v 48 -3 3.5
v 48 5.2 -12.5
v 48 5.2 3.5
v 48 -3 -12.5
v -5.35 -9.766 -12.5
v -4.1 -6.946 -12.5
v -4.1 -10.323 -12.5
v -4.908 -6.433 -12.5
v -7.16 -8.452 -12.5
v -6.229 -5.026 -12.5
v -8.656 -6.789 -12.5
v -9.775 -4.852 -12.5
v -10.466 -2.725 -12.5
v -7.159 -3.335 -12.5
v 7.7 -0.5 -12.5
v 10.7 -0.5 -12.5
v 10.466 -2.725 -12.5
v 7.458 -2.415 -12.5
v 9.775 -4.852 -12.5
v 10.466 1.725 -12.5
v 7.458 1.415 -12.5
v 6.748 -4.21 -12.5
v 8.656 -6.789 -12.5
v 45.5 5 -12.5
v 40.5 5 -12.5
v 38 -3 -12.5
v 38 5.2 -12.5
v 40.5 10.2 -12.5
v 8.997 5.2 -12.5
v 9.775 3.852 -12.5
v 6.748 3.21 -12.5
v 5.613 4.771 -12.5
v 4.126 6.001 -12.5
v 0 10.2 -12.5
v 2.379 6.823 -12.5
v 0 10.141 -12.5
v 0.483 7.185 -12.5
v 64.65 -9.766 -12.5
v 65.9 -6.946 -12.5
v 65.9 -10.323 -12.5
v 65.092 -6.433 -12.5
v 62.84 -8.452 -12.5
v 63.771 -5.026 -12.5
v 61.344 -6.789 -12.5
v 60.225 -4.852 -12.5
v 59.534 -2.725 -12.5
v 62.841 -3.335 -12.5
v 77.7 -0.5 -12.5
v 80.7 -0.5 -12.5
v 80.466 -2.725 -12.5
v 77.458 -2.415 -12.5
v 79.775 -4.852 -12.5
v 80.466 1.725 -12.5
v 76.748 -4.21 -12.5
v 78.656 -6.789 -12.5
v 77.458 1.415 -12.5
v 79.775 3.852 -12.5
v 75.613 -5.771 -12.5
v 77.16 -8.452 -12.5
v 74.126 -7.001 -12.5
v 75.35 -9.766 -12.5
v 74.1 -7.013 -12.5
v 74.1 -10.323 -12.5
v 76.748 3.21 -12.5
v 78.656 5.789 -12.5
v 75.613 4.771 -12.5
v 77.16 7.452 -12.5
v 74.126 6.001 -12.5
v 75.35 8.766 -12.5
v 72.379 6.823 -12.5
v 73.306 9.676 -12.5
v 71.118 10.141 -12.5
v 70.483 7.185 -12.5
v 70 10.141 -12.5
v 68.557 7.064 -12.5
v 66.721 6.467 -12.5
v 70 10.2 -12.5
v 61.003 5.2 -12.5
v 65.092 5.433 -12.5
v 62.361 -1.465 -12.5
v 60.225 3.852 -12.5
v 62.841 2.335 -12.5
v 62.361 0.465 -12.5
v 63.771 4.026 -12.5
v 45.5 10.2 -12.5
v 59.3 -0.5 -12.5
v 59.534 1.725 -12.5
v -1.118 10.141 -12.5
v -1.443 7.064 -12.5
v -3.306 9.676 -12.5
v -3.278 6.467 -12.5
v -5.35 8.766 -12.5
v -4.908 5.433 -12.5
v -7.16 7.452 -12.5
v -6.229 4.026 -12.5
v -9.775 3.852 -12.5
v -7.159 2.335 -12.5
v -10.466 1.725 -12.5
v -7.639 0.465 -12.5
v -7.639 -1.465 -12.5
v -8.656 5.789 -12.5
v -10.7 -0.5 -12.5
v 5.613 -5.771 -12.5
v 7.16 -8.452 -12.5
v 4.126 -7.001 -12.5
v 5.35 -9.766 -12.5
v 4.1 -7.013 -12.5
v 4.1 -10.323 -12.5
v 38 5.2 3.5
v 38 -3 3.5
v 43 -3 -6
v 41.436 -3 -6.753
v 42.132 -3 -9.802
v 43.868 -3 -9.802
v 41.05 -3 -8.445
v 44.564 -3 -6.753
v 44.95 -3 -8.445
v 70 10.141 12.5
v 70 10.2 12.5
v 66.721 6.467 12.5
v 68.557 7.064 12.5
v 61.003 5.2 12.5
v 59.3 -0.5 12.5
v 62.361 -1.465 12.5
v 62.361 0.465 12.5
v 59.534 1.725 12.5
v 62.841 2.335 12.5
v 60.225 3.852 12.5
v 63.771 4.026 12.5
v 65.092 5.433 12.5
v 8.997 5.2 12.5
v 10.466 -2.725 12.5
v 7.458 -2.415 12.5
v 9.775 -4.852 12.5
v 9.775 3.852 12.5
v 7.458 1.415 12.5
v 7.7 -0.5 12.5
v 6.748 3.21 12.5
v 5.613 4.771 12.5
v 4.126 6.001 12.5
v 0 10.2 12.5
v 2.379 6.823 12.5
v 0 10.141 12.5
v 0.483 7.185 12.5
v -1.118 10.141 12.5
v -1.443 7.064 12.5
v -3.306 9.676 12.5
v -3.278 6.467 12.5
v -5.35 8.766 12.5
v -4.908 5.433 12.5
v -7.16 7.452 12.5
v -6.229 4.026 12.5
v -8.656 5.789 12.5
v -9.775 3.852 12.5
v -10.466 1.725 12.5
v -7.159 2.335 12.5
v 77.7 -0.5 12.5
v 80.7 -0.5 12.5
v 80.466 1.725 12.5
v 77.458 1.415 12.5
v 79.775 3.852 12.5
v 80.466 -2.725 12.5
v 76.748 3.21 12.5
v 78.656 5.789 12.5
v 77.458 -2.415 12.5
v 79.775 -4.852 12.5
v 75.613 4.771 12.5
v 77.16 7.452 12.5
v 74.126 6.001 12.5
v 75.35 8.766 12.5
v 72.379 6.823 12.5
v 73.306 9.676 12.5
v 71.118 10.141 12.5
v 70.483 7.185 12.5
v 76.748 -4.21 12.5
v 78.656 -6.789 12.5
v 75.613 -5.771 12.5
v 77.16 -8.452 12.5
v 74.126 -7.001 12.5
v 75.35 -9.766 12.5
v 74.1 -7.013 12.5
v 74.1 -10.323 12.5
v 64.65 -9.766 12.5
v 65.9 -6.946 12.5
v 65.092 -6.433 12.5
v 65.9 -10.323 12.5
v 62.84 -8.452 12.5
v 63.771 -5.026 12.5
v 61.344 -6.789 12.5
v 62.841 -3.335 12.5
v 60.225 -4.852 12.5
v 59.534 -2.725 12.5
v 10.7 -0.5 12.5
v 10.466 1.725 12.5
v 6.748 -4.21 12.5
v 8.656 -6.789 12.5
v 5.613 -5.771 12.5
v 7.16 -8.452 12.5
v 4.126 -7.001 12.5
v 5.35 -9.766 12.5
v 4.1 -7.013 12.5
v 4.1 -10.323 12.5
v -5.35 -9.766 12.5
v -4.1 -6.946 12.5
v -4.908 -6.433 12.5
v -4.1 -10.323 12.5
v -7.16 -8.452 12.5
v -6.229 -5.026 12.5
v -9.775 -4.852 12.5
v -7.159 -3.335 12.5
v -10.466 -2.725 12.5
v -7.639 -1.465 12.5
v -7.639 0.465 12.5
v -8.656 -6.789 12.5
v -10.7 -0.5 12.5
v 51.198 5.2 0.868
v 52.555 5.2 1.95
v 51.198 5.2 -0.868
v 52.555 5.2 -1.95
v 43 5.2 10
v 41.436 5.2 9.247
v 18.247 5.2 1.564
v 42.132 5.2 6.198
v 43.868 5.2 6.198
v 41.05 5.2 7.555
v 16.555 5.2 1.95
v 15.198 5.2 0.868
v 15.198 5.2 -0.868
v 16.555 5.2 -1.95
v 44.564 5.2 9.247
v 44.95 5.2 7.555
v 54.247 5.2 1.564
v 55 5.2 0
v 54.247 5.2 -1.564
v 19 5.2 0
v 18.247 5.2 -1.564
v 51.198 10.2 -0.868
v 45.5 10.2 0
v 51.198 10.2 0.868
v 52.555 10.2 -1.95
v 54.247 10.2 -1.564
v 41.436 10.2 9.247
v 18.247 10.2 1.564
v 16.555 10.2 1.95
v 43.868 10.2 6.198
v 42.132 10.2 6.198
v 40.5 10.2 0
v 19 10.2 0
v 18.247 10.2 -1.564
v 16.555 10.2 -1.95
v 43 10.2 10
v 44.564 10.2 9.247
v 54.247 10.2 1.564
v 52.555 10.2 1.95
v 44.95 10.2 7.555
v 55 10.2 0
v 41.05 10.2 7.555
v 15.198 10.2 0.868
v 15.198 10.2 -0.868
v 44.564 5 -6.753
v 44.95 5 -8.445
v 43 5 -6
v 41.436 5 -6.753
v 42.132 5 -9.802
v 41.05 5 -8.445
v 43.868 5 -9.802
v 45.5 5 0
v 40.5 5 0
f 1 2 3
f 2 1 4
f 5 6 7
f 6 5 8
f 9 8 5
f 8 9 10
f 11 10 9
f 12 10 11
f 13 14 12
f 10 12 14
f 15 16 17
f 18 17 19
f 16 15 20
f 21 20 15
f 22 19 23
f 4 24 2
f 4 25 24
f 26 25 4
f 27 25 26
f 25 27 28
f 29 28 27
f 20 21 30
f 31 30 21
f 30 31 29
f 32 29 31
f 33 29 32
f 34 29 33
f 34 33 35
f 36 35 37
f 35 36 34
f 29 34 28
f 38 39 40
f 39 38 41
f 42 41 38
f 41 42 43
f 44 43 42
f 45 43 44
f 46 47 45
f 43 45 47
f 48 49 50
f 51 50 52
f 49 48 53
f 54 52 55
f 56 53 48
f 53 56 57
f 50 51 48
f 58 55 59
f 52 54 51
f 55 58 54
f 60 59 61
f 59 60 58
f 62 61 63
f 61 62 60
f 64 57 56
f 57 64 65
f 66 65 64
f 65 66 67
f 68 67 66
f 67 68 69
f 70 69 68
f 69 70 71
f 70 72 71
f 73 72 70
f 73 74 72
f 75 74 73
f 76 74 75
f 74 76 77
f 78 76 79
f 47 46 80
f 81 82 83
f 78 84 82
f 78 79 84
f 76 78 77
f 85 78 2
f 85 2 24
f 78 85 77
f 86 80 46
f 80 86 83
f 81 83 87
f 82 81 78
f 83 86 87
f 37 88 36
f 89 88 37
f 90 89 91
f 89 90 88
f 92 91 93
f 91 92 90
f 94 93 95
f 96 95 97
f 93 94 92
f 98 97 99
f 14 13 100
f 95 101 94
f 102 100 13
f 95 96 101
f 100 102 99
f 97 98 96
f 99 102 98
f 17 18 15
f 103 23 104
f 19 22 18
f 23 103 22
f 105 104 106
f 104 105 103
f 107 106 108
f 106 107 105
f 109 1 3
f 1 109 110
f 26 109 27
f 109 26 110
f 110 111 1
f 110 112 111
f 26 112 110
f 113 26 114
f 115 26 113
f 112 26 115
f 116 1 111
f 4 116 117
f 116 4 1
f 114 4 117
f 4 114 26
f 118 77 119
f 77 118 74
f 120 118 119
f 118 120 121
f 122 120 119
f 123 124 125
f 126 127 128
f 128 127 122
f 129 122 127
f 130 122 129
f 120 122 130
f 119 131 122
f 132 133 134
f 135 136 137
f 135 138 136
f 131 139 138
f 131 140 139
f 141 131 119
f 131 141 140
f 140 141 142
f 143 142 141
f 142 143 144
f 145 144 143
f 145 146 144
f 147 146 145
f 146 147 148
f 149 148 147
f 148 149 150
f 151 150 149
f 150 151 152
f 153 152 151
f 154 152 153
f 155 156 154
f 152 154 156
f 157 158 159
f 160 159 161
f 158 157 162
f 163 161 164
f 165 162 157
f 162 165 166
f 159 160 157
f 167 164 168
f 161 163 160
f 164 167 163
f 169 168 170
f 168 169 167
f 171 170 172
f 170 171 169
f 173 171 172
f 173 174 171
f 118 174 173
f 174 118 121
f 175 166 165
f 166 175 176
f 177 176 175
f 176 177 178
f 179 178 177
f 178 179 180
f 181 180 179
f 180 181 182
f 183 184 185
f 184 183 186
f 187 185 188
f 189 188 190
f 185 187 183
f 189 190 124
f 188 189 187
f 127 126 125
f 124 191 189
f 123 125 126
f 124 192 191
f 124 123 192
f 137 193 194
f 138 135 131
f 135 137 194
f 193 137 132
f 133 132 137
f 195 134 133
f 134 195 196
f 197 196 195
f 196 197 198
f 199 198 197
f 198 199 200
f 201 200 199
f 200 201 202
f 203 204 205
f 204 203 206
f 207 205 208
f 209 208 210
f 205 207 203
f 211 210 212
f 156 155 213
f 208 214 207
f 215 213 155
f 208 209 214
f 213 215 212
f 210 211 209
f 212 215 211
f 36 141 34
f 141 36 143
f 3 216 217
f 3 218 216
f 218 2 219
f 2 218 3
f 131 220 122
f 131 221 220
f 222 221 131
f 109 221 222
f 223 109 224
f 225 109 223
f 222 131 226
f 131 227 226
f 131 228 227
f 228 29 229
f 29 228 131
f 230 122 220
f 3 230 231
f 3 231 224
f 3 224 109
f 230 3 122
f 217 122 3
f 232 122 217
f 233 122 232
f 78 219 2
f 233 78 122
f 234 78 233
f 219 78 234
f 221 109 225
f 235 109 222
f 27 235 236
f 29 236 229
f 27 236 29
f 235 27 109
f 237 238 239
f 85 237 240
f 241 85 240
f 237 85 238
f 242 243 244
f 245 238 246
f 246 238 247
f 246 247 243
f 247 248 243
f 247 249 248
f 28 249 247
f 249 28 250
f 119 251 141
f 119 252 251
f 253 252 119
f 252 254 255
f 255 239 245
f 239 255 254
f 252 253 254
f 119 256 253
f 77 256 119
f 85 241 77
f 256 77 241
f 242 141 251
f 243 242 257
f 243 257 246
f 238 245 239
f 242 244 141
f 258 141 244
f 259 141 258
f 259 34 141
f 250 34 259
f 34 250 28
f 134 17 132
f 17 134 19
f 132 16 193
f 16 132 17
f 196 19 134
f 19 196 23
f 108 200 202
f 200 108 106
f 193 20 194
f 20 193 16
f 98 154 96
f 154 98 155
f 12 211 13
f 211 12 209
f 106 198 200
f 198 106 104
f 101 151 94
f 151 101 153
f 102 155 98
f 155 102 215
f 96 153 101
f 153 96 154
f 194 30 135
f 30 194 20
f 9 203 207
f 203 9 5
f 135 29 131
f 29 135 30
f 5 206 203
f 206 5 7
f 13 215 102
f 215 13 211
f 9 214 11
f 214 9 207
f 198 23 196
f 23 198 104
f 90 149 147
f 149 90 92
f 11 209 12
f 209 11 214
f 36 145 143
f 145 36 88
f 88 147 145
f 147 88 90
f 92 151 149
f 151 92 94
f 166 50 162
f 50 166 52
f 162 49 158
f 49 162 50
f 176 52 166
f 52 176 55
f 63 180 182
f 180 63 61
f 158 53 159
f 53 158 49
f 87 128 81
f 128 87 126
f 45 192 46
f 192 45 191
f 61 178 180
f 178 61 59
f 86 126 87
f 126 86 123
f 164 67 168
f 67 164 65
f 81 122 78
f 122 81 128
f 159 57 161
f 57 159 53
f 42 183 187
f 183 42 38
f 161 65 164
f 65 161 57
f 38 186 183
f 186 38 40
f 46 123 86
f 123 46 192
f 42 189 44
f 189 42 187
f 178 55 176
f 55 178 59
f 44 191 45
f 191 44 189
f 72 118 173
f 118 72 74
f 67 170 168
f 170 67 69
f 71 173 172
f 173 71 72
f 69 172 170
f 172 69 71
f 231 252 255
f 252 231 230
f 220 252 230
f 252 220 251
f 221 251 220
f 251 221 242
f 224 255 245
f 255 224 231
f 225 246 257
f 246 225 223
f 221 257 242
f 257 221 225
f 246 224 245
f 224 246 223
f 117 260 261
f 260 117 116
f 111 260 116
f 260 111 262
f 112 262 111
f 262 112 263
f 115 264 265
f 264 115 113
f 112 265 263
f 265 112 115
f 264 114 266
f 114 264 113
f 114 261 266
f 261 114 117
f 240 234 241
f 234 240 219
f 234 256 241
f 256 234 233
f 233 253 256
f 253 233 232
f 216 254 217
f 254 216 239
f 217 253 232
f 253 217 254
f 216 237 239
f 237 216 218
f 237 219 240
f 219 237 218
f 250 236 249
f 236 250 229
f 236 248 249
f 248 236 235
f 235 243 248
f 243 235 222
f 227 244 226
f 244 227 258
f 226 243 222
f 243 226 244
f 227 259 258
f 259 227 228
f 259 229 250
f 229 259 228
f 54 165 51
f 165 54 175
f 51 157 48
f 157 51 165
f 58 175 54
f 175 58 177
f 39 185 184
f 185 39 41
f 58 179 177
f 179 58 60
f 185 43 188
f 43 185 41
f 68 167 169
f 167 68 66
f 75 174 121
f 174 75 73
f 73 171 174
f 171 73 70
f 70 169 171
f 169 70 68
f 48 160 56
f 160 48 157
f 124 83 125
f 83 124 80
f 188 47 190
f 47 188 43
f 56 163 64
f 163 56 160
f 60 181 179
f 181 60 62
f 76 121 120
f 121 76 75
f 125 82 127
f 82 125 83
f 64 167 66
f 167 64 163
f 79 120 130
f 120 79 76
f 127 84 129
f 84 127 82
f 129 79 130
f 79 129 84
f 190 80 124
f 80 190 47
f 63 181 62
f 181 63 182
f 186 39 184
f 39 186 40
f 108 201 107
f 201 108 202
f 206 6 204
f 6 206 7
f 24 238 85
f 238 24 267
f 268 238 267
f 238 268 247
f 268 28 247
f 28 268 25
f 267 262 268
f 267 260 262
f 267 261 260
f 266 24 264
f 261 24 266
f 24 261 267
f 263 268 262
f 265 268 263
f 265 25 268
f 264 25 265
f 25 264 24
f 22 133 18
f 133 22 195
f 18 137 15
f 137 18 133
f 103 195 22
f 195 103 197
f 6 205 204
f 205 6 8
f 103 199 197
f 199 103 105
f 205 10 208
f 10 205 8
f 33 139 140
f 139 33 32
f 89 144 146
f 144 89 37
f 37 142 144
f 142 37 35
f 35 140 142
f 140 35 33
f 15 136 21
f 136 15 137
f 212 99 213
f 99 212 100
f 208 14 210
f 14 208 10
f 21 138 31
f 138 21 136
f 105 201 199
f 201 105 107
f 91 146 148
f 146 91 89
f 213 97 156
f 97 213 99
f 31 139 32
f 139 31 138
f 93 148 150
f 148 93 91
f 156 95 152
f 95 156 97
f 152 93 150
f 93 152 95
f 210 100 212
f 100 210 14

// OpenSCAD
// file: Rook_Config.scad
// Rook 3D Printer Configuration
// Created By Jeffrey Olijar 
// Jolijar@gmail.com

// Layer Height
LH = 0.38;

// 608 skate bearing
Bearing_OD = 22.5; 
Bearing_ID = 8;
Bearing_H = 7;

// M3 Nut Diameter
N3 = 7.5;

// M4 Screw Hole Diameter
M4 = 4;

// M5 Screw Hole Diameter
M5 = 5.4;

// M8 Rod Diameter (configure for a tight fit)
M8 = 8.2;

// M8 Nut Diameter
N8 = 15.5;

//LM8UU Bearing
LBD = 15.4; // Diameter
LBH = 25; // Height
LBI = 8;  // Inner Diameter

//Makergear Groovemount
GVO = 16.5; // Outside Diameter
GVI = 12.5;  // Inside Groove Diameter

// Distance Between Centers for X rods
DBCX = 70;
// main file
// Rook 3D Printer 
// X Carriage Holder
// Created By Jeffrey Olijar 
// Jolijar@gmail.com
// Revision 1.00
// 1 x required 

include <Rook_Config.scad> 

module Rook_X_Carriage_Holder(){



rotate(a=[180,0,0]){

difference(){ 

union(){




translate (v=[DBCX/2+8,-2,4.5]){ 
		cube(size =[10,10,16], center = true); 
		}

	translate (v=[DBCX/2,-LBD/2,0]){ 
		cube(size =[DBCX,5,25], center = true); 
		}
translate (v=[0,0.5,0]){
	cylinder(h=25,r=LBD/2+3, center = true);
}
	translate (v=[DBCX,0.5,0]){ 
		cylinder(h=25,r=LBD/2+3, center = true);
}}
union(){
translate (v=[DBCX/2+8,-10,6.25]){ 
		cube(size =[5,10,12.5], center = true); 
		}






rotate(a=[90,90,0])translate(v=[0,43,0]){ 

translate(v=[8,0,-DBCX/4]){
cylinder(h=DBCX/2,r=M4/2);
}
translate(v=[-8,0,-DBCX/4]){
cylinder(h=DBCX/2,r=M4/2);
}}





rotate(a=[90,0,0])translate(v=[DBCX/2,0,0]){ 

translate(v=[18,0,-20]){
cylinder(h=50,r=M4/2);
}
translate(v=[-18,0,-20]){
cylinder(h=50,r=M4/2);
}}
translate(v=[0,0.5,0]){
	cylinder(h=25,r=LBD/2, center = true);
}
	translate (v=[0,LBD/2,0]){ 
		cube(size =[M8,M8,25], center = true); 
	translate (v=[DBCX,-LBD/2,0]){ 
translate(v=[0,0.5,0]){
		cylinder(h=25,r=LBD/2, center = true);
}
	translate (v=[0,LBD/2,0]){ 
		cube(size =[M8,M8,25], center = true); 
}}}}}}







}












Rook_X_Carriage_Holder();
